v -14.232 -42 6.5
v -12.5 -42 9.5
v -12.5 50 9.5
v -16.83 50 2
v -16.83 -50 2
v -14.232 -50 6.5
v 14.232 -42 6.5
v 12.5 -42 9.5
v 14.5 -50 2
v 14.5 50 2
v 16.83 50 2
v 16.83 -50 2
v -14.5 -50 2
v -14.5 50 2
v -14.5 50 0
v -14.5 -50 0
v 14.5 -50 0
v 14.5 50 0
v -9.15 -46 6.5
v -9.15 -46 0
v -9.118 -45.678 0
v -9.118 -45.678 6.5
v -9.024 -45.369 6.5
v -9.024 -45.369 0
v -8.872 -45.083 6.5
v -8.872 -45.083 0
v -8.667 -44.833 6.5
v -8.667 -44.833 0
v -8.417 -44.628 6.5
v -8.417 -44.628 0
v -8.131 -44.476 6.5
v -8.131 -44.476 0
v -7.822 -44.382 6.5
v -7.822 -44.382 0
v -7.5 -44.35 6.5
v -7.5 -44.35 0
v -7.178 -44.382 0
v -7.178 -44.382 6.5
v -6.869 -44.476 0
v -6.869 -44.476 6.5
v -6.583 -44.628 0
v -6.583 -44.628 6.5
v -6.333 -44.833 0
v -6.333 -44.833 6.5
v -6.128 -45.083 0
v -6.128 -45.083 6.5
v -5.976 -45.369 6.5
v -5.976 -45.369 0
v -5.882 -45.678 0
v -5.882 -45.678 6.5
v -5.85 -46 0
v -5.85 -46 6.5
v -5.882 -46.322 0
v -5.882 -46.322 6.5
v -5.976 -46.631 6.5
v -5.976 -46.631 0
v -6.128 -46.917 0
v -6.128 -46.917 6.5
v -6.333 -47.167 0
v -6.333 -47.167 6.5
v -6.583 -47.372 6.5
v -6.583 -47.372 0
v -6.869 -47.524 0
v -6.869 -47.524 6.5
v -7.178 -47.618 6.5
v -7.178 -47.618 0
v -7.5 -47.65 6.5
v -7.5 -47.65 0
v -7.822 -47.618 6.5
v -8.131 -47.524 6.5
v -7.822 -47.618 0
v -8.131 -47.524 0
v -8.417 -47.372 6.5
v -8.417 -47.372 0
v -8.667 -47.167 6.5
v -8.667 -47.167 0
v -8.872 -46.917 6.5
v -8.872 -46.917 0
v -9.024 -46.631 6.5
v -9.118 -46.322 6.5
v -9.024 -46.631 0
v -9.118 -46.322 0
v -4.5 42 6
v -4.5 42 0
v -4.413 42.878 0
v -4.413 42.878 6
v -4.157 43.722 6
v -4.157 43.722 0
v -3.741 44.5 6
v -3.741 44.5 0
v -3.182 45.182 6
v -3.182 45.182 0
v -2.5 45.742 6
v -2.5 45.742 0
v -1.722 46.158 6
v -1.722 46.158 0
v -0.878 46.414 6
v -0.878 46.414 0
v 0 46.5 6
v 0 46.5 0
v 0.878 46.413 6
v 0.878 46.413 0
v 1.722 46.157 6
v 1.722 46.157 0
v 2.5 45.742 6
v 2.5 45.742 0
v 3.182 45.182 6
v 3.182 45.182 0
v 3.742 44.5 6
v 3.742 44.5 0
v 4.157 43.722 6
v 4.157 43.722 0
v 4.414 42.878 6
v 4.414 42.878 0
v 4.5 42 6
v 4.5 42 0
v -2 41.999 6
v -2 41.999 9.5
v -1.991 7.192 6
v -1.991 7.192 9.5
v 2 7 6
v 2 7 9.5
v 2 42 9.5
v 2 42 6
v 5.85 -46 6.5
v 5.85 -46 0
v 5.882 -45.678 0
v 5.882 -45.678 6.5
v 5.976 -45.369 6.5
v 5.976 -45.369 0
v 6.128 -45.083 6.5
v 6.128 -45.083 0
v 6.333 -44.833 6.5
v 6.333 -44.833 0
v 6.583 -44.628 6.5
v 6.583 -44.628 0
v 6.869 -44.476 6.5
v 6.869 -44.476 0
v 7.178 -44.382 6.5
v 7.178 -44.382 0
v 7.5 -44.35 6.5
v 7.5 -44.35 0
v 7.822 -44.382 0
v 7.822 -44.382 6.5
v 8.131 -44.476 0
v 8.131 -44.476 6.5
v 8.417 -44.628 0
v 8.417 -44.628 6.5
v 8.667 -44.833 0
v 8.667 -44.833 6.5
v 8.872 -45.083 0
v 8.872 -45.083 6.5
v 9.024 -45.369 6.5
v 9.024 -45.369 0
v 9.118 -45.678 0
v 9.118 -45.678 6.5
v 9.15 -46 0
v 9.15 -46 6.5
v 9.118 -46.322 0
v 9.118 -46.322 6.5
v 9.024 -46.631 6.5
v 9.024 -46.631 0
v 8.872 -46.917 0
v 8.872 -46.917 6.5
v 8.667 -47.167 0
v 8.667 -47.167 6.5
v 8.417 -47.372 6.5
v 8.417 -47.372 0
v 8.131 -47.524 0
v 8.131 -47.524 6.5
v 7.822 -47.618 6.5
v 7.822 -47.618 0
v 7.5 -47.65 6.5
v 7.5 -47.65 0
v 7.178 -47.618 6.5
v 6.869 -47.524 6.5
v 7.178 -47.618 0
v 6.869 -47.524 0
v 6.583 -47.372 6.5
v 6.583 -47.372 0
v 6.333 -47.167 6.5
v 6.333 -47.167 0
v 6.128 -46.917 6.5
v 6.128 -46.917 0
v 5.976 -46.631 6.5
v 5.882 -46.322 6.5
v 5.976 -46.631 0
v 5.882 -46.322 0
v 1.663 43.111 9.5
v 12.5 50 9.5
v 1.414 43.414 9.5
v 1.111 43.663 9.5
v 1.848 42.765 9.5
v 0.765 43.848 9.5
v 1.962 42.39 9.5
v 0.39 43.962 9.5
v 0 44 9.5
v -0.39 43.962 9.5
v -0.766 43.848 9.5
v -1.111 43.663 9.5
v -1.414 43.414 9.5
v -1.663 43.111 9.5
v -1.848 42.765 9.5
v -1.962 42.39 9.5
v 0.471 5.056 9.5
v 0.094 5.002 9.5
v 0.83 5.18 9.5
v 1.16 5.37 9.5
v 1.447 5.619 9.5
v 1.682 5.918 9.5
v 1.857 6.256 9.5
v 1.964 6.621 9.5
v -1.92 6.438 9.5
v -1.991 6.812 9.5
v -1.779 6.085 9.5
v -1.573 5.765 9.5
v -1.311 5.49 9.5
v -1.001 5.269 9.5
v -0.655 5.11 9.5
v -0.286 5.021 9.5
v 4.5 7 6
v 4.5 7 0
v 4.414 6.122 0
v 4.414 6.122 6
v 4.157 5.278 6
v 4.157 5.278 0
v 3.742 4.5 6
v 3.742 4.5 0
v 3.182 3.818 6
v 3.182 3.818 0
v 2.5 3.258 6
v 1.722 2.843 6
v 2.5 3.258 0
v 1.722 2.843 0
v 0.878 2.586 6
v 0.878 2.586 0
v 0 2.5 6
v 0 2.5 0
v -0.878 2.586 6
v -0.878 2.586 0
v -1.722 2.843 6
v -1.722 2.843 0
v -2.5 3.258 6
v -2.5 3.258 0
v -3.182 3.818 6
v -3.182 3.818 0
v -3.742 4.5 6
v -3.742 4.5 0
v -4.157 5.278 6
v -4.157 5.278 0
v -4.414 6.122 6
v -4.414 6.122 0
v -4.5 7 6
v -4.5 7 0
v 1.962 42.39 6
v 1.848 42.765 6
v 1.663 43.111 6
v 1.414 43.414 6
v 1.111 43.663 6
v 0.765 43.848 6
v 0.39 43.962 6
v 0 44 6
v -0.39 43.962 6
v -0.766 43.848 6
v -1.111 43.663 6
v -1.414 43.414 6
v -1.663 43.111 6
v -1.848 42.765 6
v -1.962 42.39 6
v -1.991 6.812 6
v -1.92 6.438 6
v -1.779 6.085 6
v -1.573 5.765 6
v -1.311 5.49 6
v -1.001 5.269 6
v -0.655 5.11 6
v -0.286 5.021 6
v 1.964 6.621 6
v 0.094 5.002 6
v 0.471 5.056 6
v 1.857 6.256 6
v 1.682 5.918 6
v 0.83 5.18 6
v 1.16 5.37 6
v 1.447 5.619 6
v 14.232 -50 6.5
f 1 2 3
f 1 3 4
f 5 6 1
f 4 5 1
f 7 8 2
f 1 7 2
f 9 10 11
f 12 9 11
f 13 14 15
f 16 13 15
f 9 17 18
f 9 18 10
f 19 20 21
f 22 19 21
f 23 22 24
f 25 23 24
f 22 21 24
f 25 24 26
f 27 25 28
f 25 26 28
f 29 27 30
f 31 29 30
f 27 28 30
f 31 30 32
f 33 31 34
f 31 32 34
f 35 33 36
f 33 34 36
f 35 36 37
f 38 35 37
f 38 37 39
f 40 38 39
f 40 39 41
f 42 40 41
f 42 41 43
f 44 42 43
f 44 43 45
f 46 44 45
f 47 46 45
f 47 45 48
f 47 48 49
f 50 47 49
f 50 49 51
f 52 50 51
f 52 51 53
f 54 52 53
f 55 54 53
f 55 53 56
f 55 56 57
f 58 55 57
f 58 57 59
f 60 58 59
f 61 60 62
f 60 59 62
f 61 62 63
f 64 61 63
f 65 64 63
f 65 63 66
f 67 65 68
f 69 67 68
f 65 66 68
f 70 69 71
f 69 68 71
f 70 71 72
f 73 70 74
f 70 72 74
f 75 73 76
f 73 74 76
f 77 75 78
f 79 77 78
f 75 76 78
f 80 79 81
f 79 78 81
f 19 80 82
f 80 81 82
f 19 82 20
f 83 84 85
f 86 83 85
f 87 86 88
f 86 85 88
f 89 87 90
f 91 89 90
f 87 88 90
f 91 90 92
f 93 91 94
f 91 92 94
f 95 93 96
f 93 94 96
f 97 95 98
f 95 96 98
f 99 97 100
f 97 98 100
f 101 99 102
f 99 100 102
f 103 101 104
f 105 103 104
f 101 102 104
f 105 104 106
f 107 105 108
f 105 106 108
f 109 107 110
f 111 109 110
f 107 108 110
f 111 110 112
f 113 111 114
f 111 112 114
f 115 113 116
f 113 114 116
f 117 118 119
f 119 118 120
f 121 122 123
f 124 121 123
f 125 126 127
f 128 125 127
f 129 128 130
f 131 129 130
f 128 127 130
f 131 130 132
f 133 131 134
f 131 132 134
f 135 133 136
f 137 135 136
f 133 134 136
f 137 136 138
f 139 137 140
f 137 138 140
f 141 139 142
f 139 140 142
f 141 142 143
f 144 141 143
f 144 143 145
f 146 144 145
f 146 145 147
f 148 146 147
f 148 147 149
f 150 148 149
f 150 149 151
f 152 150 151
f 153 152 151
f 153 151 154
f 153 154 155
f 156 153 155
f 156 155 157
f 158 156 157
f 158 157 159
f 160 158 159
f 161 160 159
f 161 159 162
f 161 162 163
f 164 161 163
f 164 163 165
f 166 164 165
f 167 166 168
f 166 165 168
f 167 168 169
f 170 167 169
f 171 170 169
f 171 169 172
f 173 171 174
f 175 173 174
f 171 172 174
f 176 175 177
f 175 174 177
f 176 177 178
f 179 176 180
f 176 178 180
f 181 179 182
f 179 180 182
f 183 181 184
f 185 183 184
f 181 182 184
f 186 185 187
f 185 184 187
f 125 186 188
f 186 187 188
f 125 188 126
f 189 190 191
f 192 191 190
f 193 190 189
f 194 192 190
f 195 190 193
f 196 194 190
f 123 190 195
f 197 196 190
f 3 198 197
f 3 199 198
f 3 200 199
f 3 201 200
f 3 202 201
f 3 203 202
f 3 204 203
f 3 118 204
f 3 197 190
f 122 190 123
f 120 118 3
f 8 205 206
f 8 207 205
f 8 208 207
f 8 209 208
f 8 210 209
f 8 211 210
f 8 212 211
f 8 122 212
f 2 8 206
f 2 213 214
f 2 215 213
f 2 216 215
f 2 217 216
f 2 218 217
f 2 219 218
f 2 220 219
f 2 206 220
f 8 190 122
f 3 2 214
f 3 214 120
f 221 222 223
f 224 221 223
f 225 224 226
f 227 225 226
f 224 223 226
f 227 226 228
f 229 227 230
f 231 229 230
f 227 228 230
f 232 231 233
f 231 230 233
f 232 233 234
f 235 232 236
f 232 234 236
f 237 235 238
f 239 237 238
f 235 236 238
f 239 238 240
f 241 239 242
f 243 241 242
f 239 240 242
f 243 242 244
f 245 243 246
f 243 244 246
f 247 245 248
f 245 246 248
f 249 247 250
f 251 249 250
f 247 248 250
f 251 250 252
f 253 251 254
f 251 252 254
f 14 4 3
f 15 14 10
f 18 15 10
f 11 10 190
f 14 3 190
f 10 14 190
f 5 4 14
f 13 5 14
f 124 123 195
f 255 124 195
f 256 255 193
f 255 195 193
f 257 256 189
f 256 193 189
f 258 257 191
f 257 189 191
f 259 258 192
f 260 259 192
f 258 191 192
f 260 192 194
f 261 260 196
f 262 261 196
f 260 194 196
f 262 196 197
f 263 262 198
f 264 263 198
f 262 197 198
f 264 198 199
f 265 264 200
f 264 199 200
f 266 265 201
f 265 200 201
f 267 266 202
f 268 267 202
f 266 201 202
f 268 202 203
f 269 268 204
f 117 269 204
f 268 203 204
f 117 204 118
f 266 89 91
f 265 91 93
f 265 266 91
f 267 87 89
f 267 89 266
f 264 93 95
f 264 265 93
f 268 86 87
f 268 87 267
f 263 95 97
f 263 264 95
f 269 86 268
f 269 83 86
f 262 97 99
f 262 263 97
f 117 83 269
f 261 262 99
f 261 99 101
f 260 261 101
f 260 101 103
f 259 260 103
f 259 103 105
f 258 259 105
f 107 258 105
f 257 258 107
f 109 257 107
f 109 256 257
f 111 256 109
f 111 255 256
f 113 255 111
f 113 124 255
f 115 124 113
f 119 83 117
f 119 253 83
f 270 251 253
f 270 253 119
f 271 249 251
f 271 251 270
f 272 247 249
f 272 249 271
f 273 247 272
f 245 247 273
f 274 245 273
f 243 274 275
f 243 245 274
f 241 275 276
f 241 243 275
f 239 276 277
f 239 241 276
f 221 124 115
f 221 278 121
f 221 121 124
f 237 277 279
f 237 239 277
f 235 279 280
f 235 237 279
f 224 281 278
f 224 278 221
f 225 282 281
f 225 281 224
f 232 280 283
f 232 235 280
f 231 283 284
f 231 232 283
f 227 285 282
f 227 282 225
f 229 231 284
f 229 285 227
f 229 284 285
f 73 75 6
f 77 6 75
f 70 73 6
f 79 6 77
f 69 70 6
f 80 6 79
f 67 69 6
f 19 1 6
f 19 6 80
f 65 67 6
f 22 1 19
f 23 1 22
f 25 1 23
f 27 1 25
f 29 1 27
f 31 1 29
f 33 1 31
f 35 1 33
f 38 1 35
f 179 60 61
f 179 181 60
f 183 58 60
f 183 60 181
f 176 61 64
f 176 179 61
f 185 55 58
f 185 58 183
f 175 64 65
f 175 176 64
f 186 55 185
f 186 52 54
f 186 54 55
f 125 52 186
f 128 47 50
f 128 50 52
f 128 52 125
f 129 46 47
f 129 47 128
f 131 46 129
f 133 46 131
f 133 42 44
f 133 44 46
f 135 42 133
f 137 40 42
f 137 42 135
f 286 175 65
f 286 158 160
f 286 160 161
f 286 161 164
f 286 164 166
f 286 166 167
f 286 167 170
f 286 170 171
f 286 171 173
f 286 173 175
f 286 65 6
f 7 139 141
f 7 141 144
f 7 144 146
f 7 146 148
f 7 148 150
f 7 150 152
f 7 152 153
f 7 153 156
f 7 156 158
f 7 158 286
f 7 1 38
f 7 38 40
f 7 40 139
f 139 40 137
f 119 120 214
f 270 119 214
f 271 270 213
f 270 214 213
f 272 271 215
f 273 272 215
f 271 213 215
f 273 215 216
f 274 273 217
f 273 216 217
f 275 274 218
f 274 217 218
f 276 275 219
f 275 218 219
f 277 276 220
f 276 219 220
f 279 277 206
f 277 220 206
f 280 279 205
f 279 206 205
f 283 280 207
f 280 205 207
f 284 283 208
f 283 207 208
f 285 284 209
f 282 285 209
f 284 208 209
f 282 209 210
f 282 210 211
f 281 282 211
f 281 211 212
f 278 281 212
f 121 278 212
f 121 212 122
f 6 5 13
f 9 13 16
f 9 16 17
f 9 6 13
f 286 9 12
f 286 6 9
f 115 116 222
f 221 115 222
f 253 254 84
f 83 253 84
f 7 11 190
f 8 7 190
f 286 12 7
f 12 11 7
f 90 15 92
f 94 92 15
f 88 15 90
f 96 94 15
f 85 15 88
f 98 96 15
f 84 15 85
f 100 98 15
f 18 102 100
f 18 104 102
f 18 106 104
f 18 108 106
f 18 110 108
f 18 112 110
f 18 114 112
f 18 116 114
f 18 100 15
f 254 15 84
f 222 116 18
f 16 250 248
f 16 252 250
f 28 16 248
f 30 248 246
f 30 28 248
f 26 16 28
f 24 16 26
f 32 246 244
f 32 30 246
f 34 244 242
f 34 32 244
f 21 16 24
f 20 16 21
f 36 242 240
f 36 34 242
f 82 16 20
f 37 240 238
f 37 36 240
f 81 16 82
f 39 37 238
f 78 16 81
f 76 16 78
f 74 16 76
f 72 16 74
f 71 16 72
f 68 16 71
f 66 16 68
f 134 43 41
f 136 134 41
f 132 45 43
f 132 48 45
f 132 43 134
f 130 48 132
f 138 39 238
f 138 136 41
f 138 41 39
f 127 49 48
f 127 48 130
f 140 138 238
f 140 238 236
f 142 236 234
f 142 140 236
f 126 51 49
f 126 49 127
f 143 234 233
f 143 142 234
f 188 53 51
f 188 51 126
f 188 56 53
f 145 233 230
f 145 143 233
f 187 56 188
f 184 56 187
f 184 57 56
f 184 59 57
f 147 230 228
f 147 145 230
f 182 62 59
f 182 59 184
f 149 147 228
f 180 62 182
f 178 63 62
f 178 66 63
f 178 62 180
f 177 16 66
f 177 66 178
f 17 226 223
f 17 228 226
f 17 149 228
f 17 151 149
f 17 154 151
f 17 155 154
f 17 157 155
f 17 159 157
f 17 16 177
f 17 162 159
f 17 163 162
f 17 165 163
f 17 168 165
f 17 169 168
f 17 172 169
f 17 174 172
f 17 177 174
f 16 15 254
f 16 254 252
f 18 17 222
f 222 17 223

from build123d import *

# Parameters (mm, degrees)
F1_DEPTH   = 50
F1_FACE1_W = 25
F1_FACE1_H = 100
F3_DEPTH   = 6
F5_DEPTH   = 25
F6_W       = 25
F6_H       = 8
F7_DEPTH   = 3
F9_D       = 3.3


with BuildPart() as f1:
    # F0 (on Front) → F1 (new body, symmetric)
    with BuildSketch(Plane.XZ):
        Polygon((-16.8301270189, 2), (-14.5, 2), (-14.5, 0), (14.5, 0), (14.5, 2), (16.8301270189, 2), (12.5, 9.5), (-12.5, 9.5), align=None)
    extrude(amount=F1_DEPTH, both=True)

    # F2 (on face) + F1_face1 (on face) → F3 (cut)
    with BuildSketch(Plane(origin=(0, 0, 0), x_dir=(1, 0, 0), z_dir=(0, 0, -1))):
        with BuildLine():
            Line((4.5, -42), (4.5, -7))
            ThreePointArc((4.5, -7), (0, -2.5), (-4.5, -7))
            Line((-4.5, -7), (-4.5, -42))
            Line((-4.5, -42), (-4.5, -42.0004010455))
            ThreePointArc((-4.4999999821, -42.0004010455), (0.0002005227, -46.4999999955), (4.5, -42))
        make_face()
    with BuildSketch(Plane.XY.offset(9.5)):
        Rectangle(F1_FACE1_W, F1_FACE1_H)
    extrude(amount=-F3_DEPTH, dir=(0, 0, -1), mode=Mode.SUBTRACT)

    # F4 (on face) → F5 (cut)
    with BuildSketch(Plane.XY.offset(9.5)):
        with BuildLine():
            ThreePointArc((-1.9907275363, 7.1923639157), (-0.0962936325, 5.0023194609), (2, 7))
            ThreePointArc((2, 7), (0.0962936325, 8.9976805391), (-1.9907275363, 7.1923639157))
        make_face()
        with BuildLine():
            Line((2, 7), (2, 42))
            ThreePointArc((2, 42), (0.0002663937, 40.0000000177), (-1.999999929, 41.9994672126))
            Line((-1.999999929, 41.9994672126), (-1.9907275363, 7.1923639157))
            ThreePointArc((-1.9907275363, 7.1923639157), (0.0962936325, 8.9976805391), (2, 7))
        make_face()
        with BuildLine():
            ThreePointArc((-1.999999929, 41.9994672126), (0.0002663937, 40.0000000177), (2, 42))
            ThreePointArc((2, 42), (-0.0002663937, 43.9999999823), (-1.999999929, 41.9994672126))
        make_face()
    extrude(amount=-F5_DEPTH, mode=Mode.SUBTRACT)

    # F6 (on face) → F7 (cut)
    with BuildSketch(Plane.XY.offset(9.5)):
        with Locations((0, -46)):
            Rectangle(F6_W, F6_H)
        Polygon((-23.7841614955, -55.5199324694), (24.0457867705, -55.5199324694), (24.0457867705, -42), (12.5, -42), (12.5, -50), (-12.5, -50), (-12.5, -42), (-23.7841614955, -42), align=None)
    extrude(amount=-F7_DEPTH, mode=Mode.SUBTRACT)

    # F9 (through all)
    with Locations(Plane.XY.offset(6.5)):
        with Locations((-7.5, -46), (7.5, -46)):
            Hole(F9_D / 2)


solid = f1.part
